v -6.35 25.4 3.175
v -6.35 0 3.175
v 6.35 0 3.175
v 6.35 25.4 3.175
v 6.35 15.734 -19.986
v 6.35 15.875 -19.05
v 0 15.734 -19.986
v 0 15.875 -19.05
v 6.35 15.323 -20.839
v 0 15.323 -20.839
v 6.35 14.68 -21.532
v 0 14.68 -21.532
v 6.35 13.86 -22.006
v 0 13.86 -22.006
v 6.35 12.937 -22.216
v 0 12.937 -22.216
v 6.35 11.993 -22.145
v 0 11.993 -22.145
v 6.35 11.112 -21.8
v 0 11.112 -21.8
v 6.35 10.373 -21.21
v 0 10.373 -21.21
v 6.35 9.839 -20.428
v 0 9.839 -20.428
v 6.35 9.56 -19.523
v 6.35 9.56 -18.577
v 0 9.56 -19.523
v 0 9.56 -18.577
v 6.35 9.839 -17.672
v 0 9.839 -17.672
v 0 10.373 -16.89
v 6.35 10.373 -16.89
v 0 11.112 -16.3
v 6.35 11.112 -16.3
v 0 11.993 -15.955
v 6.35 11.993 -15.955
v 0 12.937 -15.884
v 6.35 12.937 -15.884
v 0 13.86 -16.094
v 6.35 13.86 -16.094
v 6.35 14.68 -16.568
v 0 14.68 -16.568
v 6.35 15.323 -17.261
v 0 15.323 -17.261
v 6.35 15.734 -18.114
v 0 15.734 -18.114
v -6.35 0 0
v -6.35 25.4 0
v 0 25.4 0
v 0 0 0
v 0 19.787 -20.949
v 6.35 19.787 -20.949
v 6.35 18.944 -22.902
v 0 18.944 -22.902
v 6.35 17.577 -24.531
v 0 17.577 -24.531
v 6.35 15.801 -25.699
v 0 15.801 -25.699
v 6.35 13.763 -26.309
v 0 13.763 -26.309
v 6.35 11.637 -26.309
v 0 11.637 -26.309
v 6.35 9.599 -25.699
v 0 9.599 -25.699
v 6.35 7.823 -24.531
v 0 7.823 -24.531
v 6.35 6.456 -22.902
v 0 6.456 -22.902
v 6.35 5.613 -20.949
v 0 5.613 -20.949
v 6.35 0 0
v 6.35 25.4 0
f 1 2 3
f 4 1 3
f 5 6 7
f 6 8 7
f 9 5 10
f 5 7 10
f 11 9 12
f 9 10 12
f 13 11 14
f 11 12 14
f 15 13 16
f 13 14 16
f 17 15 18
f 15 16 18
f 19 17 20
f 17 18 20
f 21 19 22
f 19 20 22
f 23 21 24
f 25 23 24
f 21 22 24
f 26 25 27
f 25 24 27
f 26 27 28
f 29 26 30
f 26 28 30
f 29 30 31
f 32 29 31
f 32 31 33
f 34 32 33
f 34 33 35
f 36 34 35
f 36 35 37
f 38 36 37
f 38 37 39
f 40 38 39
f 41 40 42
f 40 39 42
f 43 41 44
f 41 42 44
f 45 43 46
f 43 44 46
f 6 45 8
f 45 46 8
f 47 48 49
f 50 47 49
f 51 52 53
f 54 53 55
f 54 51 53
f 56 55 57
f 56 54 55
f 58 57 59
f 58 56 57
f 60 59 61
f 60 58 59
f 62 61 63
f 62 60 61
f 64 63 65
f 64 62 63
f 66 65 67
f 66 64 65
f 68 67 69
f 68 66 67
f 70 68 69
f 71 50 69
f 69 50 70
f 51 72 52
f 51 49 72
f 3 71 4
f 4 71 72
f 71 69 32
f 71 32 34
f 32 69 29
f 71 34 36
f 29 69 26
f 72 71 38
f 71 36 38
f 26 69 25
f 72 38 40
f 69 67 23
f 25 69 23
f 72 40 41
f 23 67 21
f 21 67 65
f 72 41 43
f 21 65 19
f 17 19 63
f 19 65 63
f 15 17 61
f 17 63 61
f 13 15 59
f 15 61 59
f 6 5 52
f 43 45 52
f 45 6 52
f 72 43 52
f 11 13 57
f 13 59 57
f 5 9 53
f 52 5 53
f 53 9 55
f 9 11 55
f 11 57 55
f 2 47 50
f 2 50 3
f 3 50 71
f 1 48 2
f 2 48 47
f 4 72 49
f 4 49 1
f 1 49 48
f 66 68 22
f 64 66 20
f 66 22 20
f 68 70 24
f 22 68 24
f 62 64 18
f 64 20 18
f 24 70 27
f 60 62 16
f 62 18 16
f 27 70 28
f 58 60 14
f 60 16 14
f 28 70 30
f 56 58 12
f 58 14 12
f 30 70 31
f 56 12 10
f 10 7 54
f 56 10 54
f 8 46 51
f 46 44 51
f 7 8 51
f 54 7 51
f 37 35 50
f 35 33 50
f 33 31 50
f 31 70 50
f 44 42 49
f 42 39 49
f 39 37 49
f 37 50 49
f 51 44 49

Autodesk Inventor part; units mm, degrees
ref_plane "YZ Plane" through (0, 0, 0) normal (1, 0, 0) x (0, 1, 0)
ref_plane "XZ Plane" through (0, 0, 0) normal (0, 1, 0) x (-1, 0, 0)
ref_plane "XY Plane" through (0, 0, 0) normal (0, 0, 1) x (1, 0, 0)
sketch "Sketch1" plane through (0, 0, 0) normal (1, 0, 0) x (0, 1, 0)
  line L0 (0, 0) -> (25.4, 0)
  line L1 (25.4, 0) -> (19.7868, -20.9489)
  line L2 (0, 0) -> (5.6132, -20.9489)
  line L3 (12.7, 0) -> (12.7, -162.0582)
  arc A0 (5.6132, -20.9489) -> (19.7868, -20.9489) centre (12.7, -19.05) ccw
  circle A1 centre (12.7, -19.05) radius 3.175
  dimension "d0" = 75
  dimension "d1" = 75
  dimension "d2" = 25.4
  dimension "d3" = 19.05
  dimension "d4" = 6.35
extrude "Extrusion1" add sketch "Sketch1" along normal blind 6.35 contours L0 L3 A1 A0 L2 | L0 L1 A0 L3 A1
sketch "Sketch2" plane through (0, 0, 0) normal (0, 0, 1) x (1, 0, 0)
  line L0 (6.35, 25.4) -> (-6.35, 25.4)
  line L1 (-6.35, 25.4) -> (-6.35, 0)
  line L2 (-6.35, 0) -> (6.35, 0)
  line L3 (6.35, 0) -> (6.35, 25.4)
  dimension "d7" = 12.7
extrude "Extrusion2" add sketch "Sketch2" along normal blind 3.175
equation "\"d1\" = d0"
properties part number "TabletMount-Base-Hinge"
